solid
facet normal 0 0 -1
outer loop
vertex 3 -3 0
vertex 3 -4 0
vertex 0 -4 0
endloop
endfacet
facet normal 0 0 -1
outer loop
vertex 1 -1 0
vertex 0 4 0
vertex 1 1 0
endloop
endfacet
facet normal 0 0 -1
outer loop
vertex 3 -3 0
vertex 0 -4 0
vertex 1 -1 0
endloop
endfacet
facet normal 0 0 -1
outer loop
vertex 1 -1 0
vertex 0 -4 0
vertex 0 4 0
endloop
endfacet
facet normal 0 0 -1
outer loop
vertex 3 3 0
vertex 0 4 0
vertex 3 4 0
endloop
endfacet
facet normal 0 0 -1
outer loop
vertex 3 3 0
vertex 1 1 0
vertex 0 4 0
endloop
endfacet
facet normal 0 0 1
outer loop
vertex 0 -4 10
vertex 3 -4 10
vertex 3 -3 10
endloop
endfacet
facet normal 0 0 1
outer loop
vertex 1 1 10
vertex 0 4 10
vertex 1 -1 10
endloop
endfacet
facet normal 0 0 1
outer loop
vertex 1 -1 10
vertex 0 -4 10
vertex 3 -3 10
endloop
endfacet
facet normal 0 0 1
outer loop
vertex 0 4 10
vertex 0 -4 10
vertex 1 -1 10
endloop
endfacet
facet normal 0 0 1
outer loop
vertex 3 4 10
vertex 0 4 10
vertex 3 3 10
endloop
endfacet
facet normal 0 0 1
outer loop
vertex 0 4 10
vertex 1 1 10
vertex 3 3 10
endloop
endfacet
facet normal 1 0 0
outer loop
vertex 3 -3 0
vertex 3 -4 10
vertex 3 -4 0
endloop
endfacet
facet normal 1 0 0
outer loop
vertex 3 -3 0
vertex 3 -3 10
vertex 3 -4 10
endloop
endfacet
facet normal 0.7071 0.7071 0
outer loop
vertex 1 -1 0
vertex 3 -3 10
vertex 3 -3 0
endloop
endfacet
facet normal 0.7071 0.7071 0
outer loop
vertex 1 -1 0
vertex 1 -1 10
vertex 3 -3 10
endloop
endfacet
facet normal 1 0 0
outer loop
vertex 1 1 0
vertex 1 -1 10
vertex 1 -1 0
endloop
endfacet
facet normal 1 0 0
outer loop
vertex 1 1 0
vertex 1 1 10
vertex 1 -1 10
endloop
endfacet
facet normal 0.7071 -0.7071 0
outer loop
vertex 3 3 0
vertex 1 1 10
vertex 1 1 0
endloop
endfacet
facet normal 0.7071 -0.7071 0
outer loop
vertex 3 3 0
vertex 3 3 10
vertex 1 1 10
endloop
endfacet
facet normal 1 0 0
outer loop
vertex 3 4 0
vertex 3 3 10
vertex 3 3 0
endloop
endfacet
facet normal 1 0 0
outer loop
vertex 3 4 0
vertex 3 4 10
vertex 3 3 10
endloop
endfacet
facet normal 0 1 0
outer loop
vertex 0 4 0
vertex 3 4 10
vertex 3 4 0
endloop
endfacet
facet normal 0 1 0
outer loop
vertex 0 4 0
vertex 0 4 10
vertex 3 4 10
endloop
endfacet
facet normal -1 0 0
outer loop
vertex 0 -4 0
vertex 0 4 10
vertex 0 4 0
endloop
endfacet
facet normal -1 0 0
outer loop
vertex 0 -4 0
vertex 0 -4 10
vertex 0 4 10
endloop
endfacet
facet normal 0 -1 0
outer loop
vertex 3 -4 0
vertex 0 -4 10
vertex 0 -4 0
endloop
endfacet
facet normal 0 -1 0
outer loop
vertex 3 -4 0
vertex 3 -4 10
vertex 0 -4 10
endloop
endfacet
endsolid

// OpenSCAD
w=3;
h =8;
t=1;
module slot(w,h,t,l) {
 
points = [[0,0],[0,h/2],[w,h/2],[w,(h/2)-t],[t,((h/2)-t)-(w-t)], [t,0]];
linear_extrude(height = l) union() {
    mirror(v = [0,1,0]) polygon(points = points);
    polygon(points = points);
}
 
}
slot(w,h,t,10);
